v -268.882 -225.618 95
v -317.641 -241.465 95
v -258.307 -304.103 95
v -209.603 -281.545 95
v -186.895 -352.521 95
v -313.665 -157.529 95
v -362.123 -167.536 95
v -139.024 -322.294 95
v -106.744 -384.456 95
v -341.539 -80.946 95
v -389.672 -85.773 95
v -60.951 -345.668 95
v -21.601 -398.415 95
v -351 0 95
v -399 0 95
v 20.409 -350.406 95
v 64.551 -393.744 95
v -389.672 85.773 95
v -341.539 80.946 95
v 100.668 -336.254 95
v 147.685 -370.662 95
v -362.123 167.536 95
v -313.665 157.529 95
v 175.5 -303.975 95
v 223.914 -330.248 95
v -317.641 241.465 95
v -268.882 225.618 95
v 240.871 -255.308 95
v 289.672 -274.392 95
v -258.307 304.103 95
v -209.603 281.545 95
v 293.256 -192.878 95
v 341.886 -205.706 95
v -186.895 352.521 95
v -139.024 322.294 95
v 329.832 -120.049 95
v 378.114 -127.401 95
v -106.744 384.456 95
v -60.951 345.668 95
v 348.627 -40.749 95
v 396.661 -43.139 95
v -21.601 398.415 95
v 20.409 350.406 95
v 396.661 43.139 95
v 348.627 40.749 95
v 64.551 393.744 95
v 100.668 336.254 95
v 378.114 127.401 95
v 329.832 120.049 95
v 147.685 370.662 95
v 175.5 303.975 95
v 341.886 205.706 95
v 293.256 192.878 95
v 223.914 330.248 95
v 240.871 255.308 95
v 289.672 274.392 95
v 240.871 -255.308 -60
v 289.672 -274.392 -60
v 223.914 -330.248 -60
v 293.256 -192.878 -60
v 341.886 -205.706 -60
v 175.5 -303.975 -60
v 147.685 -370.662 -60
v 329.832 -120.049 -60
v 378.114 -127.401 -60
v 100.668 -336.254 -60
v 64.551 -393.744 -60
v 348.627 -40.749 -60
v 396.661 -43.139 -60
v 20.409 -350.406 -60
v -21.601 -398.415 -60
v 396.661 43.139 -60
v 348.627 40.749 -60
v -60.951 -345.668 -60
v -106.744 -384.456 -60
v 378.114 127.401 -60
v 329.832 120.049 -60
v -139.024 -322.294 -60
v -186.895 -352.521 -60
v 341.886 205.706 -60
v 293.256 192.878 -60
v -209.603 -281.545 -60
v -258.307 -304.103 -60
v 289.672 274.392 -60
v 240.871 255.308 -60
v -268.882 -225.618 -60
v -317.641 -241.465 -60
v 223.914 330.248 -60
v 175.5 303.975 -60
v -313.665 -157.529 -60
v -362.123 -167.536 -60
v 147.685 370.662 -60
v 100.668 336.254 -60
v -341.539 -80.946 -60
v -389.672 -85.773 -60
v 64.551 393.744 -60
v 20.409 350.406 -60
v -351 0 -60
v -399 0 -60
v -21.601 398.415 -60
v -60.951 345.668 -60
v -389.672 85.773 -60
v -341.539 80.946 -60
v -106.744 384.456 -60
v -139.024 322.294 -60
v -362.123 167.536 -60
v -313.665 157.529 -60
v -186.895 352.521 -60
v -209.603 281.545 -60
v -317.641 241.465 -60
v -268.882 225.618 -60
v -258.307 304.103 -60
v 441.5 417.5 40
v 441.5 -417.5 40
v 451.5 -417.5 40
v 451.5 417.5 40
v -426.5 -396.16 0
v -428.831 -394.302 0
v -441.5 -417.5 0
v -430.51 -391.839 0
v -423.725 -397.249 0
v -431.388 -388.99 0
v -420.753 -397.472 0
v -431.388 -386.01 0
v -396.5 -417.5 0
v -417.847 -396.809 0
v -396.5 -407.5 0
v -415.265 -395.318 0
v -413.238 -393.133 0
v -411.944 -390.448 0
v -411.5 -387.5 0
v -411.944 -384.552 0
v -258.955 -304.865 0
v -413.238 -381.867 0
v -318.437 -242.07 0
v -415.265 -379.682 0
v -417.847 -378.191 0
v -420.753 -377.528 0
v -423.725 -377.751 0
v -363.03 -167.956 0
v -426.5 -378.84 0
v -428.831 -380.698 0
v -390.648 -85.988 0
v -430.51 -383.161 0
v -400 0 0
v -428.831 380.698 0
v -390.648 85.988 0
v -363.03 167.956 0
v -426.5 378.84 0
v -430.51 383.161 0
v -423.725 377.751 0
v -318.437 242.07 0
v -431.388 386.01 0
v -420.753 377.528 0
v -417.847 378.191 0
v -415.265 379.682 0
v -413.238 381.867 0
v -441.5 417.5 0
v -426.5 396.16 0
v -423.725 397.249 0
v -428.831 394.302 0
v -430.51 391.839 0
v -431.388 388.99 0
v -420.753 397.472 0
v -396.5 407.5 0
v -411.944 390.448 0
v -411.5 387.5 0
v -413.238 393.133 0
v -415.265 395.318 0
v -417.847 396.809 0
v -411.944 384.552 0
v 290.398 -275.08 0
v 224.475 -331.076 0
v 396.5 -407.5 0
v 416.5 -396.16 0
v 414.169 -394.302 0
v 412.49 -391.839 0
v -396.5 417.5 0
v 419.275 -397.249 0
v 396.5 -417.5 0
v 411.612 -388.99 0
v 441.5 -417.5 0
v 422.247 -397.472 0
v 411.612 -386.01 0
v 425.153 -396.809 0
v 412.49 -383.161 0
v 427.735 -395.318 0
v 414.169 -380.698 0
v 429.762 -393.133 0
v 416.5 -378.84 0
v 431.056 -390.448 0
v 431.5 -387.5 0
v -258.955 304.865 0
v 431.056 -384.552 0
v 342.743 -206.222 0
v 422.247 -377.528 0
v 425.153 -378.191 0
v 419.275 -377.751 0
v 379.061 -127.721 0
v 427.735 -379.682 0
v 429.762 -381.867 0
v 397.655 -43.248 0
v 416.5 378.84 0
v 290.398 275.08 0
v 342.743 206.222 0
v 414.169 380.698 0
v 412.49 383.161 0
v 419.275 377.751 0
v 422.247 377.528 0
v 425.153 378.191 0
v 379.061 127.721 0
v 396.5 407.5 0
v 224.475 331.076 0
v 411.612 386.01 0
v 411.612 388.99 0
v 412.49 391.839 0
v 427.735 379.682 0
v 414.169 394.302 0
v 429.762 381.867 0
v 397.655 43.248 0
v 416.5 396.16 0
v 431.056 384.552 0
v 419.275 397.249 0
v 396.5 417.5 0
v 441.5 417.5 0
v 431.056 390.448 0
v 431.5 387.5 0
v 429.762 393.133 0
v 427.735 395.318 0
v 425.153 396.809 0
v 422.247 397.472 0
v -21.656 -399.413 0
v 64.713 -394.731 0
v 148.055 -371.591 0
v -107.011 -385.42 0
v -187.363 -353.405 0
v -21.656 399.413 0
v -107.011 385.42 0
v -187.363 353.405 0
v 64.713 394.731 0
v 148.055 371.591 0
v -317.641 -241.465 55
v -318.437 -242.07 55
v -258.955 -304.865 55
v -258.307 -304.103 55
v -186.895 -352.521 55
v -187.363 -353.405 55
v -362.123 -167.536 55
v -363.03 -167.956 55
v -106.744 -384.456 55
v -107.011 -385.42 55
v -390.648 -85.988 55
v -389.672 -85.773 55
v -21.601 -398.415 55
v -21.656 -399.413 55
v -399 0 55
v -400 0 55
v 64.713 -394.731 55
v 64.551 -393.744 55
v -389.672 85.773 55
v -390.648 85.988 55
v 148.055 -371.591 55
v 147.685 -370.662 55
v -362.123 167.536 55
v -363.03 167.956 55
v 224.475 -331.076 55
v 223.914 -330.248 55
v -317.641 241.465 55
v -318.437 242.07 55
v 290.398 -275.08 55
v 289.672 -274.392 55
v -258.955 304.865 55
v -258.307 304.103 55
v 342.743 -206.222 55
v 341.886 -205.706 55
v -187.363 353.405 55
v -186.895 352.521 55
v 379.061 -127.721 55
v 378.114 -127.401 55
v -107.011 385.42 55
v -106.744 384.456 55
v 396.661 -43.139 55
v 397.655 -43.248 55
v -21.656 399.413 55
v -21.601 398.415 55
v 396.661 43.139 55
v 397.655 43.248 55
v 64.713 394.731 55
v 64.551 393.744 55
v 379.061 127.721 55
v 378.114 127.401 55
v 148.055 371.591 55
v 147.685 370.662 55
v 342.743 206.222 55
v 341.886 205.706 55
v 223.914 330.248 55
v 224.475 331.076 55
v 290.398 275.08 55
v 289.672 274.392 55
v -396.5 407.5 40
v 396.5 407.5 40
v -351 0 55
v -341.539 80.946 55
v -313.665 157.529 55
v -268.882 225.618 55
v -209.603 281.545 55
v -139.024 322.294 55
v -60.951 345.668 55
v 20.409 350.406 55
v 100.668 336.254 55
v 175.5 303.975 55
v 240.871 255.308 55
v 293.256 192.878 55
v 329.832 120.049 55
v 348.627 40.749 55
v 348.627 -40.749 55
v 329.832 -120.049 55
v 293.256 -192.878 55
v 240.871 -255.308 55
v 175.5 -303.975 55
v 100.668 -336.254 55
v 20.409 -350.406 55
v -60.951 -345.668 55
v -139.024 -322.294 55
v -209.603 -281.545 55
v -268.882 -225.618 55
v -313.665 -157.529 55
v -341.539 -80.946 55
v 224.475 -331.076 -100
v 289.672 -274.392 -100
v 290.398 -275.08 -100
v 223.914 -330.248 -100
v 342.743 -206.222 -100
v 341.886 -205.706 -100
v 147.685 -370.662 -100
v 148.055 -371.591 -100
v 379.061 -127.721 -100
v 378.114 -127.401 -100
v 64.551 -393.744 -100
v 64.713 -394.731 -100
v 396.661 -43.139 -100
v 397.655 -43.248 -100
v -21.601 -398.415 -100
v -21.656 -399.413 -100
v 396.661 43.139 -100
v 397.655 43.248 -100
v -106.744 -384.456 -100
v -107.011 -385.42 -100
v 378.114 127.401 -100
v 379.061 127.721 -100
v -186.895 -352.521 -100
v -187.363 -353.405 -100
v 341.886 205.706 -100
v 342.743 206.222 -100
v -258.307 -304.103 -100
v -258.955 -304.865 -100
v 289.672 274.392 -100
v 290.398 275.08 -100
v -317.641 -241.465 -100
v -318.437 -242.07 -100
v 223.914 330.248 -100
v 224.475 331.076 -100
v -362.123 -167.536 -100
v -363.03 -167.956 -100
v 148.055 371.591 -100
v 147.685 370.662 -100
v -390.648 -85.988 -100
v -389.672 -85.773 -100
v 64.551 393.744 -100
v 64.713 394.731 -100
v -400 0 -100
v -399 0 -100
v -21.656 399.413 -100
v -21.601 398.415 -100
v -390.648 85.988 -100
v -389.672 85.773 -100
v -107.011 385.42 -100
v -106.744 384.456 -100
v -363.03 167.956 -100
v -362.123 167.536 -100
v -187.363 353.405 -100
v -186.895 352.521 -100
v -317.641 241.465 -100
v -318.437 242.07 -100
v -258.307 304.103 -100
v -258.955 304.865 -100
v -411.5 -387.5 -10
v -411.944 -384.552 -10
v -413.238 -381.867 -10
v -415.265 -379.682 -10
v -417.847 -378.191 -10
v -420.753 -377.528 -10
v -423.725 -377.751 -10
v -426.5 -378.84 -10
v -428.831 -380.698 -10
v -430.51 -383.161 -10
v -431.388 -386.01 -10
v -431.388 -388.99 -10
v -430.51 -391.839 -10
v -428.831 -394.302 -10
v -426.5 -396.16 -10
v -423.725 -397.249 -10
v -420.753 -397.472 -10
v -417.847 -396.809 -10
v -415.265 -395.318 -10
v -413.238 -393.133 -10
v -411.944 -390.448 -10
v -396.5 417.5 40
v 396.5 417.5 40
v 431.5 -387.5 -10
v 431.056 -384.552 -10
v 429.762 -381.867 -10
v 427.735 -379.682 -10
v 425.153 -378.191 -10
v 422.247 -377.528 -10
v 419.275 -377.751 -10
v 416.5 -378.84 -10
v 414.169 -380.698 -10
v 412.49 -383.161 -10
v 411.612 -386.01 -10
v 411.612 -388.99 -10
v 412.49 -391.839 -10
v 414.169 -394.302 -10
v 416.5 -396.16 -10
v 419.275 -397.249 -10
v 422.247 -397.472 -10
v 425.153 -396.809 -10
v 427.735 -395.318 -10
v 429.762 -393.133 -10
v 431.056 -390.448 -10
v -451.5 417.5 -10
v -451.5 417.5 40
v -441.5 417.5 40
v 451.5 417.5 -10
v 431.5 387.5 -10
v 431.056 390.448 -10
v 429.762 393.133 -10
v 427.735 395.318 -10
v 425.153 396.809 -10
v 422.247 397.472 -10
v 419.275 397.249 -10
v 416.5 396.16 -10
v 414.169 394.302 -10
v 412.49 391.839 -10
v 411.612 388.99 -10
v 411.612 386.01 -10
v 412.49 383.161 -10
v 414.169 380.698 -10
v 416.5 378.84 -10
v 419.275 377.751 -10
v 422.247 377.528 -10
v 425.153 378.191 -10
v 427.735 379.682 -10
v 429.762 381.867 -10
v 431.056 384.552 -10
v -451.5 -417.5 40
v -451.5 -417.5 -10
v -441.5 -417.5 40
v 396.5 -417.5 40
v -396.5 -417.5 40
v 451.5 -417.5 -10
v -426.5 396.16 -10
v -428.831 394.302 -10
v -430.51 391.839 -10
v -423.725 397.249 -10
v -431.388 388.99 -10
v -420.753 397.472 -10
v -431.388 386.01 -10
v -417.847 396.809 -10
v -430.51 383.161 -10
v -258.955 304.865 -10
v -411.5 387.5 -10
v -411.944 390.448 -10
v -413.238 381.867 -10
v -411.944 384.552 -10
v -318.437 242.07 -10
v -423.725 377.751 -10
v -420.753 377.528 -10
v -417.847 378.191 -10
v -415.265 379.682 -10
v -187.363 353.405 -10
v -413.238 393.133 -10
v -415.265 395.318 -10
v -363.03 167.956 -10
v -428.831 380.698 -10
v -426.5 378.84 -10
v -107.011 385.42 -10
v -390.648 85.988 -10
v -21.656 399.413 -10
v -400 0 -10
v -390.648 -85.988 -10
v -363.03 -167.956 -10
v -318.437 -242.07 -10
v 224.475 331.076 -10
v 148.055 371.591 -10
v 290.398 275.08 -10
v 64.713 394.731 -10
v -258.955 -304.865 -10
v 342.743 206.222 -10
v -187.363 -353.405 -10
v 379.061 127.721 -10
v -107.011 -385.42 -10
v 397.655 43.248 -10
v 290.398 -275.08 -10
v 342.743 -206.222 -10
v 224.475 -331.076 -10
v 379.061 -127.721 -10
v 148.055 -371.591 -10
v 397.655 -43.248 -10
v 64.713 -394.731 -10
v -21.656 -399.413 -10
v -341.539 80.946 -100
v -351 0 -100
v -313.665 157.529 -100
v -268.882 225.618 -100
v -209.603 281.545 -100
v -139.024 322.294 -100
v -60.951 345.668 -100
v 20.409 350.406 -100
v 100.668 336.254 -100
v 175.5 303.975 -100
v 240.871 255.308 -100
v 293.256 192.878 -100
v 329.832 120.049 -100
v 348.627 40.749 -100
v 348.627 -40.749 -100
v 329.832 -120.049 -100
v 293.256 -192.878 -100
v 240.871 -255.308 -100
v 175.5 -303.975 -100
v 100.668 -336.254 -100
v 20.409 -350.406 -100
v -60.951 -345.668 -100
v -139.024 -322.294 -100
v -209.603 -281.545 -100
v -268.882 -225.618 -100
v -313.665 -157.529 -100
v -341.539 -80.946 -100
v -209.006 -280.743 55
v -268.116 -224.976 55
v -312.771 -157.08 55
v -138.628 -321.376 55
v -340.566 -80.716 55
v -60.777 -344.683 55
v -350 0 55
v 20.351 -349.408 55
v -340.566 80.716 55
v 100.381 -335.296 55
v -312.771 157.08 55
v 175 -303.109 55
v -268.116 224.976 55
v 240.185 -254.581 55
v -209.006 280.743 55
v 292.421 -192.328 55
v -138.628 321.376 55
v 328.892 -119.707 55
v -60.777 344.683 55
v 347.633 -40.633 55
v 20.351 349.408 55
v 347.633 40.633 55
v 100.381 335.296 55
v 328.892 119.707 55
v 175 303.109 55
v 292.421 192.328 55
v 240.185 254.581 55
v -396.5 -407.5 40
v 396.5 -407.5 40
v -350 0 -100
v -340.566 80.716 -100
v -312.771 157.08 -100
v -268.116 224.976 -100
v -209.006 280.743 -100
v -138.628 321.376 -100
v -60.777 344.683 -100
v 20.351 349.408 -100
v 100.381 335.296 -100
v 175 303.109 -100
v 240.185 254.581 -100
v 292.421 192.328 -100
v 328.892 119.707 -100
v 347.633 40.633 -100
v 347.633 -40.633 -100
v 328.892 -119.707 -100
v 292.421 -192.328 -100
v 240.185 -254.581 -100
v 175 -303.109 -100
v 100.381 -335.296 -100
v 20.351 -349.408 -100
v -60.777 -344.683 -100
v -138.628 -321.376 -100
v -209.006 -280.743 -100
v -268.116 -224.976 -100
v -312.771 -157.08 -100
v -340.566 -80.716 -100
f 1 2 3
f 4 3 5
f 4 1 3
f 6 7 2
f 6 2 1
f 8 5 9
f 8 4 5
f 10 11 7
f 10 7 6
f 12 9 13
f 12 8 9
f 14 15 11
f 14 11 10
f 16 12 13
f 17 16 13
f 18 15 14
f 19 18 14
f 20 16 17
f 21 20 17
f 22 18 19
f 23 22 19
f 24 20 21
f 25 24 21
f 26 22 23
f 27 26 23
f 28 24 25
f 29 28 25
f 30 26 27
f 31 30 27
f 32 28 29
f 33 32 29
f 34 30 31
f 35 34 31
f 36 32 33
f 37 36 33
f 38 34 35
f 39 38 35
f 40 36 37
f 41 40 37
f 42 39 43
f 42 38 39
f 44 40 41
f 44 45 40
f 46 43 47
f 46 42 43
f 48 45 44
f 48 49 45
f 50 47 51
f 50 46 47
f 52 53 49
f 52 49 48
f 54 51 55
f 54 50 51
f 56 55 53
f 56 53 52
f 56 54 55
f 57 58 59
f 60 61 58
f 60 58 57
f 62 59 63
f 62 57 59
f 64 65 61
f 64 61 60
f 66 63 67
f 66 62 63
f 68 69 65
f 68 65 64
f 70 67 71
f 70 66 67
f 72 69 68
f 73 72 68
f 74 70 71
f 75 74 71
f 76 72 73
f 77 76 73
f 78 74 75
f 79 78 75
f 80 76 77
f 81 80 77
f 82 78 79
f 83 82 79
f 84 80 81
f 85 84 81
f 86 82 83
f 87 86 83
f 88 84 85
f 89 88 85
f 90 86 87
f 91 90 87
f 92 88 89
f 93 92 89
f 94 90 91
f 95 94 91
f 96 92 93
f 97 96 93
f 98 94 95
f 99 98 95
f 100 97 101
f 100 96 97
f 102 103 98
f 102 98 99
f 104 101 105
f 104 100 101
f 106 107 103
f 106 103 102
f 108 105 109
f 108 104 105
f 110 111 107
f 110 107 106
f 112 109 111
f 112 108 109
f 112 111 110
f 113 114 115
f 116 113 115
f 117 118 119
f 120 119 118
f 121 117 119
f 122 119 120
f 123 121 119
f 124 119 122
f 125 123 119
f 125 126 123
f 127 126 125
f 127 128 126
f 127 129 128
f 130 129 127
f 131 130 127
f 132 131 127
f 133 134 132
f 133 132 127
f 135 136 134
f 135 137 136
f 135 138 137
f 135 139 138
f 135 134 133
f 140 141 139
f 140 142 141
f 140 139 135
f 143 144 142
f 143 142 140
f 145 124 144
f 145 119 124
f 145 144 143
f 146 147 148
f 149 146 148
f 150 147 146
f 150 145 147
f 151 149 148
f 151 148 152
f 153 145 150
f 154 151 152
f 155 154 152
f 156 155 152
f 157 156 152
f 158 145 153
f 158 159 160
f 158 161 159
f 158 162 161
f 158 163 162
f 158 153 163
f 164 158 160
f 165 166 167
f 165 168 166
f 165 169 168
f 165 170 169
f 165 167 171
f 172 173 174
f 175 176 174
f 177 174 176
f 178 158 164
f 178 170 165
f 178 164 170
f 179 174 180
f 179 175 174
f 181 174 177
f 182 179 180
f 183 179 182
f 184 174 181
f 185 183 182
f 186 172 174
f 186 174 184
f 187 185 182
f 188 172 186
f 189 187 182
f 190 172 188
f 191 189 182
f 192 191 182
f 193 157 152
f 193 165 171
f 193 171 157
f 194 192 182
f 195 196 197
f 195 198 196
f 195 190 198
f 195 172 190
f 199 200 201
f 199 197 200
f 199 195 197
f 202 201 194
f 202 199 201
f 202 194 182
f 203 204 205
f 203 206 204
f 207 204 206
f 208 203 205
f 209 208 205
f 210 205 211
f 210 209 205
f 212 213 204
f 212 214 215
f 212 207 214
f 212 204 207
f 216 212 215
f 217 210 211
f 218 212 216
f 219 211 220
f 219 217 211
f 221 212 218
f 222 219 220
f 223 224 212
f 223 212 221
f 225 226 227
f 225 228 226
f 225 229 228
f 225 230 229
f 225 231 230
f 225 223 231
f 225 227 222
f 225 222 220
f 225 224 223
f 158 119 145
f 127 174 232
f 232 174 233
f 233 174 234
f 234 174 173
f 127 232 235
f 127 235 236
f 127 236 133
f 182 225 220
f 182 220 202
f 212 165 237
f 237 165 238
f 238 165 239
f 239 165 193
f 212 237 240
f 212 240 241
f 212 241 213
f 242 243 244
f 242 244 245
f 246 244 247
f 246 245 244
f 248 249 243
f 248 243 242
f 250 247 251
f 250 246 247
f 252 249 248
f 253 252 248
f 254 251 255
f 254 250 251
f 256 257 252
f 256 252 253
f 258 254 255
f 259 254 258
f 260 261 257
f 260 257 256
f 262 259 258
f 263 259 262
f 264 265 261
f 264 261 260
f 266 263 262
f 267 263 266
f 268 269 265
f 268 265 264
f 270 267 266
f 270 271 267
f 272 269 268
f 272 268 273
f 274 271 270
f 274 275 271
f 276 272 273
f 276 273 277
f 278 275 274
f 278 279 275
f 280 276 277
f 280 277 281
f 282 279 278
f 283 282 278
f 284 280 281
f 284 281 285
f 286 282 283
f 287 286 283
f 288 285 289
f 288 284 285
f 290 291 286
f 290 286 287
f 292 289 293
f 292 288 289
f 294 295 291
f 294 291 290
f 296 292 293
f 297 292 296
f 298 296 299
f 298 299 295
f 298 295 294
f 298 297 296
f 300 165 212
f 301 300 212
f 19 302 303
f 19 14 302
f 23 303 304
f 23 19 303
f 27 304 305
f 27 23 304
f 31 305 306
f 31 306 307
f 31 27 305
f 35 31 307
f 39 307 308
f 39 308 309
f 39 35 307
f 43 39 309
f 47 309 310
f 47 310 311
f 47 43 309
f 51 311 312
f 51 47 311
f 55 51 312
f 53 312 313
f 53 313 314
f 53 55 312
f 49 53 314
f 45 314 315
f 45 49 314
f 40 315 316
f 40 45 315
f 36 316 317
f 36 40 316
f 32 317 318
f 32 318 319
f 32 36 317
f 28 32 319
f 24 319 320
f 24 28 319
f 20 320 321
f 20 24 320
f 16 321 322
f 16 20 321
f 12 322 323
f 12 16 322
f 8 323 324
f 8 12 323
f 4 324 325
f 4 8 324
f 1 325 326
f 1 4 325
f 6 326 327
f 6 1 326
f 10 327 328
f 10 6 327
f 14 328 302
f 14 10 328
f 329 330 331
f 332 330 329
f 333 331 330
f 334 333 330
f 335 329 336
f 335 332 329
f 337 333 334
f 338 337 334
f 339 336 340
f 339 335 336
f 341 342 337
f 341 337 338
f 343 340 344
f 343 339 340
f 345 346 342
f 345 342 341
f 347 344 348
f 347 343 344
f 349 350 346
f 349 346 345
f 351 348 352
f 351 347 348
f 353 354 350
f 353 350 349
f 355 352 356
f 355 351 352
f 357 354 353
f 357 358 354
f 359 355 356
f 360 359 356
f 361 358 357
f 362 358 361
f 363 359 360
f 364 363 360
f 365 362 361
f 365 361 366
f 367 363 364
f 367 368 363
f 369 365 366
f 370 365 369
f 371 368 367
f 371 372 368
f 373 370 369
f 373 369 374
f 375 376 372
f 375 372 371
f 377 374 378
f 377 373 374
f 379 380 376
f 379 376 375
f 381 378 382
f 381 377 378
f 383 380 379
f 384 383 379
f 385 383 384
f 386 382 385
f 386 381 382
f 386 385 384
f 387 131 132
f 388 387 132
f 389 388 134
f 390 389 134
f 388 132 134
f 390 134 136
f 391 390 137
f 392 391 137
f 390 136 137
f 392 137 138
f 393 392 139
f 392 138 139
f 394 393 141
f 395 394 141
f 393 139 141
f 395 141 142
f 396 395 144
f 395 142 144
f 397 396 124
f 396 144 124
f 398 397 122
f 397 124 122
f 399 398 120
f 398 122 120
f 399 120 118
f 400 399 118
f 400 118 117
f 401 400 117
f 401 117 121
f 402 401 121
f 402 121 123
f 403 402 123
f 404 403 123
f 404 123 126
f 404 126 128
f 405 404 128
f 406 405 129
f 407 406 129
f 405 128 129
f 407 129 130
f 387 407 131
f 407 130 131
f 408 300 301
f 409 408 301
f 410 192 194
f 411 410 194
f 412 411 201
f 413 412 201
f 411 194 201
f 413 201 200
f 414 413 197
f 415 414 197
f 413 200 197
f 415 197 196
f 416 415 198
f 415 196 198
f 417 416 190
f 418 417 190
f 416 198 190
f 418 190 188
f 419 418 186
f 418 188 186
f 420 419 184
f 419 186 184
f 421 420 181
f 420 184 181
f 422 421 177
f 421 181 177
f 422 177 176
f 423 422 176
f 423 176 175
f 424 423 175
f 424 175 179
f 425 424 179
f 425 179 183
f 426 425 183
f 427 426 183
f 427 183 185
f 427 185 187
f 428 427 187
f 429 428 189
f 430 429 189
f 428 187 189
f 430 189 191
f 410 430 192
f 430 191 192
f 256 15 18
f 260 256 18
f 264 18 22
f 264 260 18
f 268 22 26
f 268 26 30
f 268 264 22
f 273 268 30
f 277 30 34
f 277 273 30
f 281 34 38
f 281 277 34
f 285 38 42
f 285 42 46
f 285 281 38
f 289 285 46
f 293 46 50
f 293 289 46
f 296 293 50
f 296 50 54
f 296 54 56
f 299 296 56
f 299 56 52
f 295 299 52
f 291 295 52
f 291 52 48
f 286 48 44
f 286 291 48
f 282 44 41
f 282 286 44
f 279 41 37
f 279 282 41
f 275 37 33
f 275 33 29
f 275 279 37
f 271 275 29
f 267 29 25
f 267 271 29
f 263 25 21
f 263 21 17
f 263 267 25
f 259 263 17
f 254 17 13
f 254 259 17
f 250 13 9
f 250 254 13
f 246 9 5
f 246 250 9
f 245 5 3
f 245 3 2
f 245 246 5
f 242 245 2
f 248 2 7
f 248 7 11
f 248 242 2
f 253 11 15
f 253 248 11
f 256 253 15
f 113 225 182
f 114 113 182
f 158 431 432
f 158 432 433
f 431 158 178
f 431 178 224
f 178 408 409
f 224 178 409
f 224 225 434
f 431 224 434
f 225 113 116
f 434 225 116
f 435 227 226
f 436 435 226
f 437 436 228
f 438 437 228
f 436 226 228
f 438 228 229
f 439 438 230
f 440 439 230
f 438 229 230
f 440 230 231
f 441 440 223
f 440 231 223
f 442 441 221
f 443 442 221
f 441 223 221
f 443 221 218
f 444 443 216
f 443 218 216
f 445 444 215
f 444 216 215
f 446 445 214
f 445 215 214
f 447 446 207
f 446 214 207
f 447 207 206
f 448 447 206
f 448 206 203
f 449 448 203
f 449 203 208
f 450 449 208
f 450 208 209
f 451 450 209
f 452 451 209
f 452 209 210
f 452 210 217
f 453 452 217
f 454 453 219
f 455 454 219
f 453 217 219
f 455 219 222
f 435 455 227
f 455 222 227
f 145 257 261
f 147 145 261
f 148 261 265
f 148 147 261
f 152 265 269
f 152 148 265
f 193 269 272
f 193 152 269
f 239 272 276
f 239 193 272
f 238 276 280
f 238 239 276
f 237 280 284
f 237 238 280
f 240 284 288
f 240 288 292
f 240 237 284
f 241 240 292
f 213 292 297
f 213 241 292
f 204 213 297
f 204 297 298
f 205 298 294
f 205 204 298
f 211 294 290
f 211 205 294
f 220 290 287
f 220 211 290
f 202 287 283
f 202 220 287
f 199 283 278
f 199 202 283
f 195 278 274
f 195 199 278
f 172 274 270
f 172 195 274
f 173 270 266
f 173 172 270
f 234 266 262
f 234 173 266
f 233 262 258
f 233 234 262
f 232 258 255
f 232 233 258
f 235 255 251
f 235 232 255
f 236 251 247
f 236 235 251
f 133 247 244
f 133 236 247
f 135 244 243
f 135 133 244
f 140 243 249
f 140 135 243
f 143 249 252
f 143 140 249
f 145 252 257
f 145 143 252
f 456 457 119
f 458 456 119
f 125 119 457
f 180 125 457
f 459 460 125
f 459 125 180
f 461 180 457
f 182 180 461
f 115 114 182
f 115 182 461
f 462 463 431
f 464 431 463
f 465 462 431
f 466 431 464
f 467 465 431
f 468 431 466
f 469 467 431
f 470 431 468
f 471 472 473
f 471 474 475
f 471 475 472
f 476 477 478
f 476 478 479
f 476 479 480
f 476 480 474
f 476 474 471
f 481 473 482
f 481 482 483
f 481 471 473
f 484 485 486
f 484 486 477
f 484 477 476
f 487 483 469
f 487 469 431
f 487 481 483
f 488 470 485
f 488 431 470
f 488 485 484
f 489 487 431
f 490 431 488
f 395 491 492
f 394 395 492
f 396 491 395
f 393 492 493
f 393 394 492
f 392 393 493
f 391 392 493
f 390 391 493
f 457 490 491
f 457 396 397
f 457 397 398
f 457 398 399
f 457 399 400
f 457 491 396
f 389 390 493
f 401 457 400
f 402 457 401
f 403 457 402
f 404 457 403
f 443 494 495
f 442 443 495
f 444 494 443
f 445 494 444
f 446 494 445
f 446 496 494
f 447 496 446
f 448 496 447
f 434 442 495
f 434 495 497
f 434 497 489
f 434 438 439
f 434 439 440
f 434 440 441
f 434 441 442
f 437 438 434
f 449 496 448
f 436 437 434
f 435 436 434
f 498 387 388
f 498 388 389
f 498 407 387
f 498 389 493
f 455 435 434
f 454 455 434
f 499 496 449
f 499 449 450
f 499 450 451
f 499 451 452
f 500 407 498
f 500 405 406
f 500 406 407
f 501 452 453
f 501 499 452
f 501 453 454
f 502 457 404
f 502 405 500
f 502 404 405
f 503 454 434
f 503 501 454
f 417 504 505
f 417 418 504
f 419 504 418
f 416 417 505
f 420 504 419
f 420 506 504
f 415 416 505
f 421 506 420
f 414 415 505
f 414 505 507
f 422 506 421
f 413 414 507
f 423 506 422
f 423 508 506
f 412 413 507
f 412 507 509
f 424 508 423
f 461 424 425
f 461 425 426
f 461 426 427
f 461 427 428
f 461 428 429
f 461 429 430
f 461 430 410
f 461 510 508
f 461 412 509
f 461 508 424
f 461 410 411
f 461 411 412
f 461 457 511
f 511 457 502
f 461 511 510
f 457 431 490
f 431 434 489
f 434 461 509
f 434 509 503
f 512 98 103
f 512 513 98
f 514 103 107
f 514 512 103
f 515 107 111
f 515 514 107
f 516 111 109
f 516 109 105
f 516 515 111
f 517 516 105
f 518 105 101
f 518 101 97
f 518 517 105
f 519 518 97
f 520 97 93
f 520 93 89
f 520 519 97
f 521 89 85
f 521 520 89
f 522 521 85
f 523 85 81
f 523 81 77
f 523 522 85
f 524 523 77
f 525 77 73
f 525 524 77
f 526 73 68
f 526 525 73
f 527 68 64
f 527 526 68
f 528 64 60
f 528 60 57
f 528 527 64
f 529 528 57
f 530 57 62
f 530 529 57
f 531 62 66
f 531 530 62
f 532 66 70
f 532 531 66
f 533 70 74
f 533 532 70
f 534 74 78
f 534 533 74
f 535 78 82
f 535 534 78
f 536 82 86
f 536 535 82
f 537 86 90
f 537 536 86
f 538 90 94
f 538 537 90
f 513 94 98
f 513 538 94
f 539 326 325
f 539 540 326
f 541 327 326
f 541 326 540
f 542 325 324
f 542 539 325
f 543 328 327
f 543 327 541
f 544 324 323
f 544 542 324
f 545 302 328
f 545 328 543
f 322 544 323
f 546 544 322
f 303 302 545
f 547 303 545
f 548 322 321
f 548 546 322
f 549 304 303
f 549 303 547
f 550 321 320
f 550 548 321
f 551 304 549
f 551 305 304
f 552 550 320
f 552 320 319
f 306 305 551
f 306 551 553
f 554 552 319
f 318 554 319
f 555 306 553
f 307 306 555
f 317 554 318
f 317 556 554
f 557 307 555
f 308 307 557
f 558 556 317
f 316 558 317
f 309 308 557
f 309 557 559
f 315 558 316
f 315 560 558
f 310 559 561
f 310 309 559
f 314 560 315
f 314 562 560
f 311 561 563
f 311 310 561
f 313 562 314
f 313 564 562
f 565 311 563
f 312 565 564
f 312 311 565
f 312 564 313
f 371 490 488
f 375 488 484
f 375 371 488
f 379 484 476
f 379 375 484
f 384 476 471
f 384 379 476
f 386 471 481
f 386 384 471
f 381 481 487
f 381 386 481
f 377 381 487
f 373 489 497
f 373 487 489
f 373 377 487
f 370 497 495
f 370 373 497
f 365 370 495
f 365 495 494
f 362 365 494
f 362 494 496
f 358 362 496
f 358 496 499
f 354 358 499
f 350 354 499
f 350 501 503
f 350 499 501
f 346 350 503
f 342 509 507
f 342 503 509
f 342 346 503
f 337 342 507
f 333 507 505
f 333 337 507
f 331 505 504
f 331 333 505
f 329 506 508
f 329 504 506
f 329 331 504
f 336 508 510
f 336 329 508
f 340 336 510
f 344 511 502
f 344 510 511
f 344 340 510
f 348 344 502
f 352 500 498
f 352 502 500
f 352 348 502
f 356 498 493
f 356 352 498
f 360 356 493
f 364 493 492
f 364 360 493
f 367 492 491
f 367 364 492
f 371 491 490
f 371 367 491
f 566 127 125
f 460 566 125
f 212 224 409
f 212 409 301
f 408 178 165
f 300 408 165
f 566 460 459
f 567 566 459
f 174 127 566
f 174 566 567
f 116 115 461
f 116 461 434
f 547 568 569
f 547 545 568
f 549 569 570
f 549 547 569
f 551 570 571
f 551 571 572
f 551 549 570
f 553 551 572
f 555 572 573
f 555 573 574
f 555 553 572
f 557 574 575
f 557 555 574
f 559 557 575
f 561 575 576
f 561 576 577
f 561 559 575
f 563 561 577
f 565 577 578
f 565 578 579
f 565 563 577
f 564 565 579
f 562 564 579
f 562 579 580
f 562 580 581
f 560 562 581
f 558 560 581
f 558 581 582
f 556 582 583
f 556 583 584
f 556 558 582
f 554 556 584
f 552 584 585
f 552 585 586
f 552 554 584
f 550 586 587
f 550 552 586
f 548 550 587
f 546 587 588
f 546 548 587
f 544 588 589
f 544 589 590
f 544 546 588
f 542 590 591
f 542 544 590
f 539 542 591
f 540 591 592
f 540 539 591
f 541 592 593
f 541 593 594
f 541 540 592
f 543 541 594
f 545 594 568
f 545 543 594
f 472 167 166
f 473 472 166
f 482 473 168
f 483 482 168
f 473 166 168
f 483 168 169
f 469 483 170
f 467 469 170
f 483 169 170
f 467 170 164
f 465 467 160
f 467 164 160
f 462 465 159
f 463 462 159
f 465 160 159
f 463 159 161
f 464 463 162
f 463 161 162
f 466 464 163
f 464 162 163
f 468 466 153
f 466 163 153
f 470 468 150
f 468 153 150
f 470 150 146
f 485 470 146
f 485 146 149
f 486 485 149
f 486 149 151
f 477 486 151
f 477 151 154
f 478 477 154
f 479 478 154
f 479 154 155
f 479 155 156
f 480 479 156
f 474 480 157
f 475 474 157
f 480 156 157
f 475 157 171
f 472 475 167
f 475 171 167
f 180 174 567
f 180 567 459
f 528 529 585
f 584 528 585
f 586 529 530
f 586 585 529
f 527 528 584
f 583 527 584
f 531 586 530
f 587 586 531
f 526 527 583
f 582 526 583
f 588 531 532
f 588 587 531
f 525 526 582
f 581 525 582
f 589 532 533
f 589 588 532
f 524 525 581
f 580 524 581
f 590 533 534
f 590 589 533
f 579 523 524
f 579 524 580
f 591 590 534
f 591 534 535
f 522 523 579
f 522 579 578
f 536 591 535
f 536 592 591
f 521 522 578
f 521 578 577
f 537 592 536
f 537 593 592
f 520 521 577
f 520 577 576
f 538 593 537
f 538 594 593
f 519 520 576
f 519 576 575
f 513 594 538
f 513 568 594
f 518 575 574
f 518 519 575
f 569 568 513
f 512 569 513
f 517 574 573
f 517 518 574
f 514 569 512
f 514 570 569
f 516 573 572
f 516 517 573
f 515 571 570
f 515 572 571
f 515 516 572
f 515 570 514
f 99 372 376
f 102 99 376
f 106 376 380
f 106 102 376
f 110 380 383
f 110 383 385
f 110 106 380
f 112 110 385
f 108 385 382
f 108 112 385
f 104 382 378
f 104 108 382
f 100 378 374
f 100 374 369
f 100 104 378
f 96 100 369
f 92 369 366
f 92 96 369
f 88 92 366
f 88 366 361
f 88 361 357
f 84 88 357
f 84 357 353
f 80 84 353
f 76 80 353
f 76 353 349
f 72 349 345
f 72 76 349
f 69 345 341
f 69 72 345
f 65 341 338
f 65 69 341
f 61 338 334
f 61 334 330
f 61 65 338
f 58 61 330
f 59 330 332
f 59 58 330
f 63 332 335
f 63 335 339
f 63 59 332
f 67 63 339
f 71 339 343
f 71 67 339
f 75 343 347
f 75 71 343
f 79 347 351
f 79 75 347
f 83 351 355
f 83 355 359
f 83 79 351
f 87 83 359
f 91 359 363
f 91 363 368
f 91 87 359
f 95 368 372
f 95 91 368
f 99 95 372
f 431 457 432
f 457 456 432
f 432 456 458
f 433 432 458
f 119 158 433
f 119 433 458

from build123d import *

# Parameters (mm, degrees)
F2_W     = 903
F2_H     = 835
F2_R     = 10
F2_R_2   = 400
F3_DEPTH = 10
F4_W     = 793
F4_H     = 10
F4_W_2   = 10
F4_H_2   = 835
F5_DEPTH = 50


with BuildPart() as f1:
    # F0 (on Front) → F1 (revolve)
    with BuildSketch(Plane.XZ):
        Polygon((-351, -100), (-350, -100), (-350, 55), (-351, 55), (-351, 95), (-399, 95), (-399, 55), (-400, 55), (-400, -100), (-399, -100), (-399, -60), (-351, -60), align=None)
    revolve(axis=Axis((0, 0, -77.049306), (0, 0, -1)))

    # F2 (on Top) → F3 (join)
    with BuildSketch(Plane.XY):
        Rectangle(F2_W, F2_H)
        with Locations((-421.5, -387.5)):
            Circle(F2_R, mode=Mode.SUBTRACT)
        with Locations((421.5, -387.5)):
            Circle(F2_R, mode=Mode.SUBTRACT)
        with Locations((-421.5, 387.5)):
            Circle(F2_R, mode=Mode.SUBTRACT)
        Circle(F2_R_2, mode=Mode.SUBTRACT)
        with Locations((421.5, 387.5)):
            Circle(F2_R, mode=Mode.SUBTRACT)
    extrude(amount=-F3_DEPTH)

    # F4 (on face) → F5 (join)
    with BuildSketch(Plane(origin=(0, 0, -10), x_dir=(1, 0, 0), z_dir=(0, 0, -1))):
        with Locations((0, 412.5)):
            Rectangle(F4_W, F4_H)
        with Locations((-446.5, 0)):
            Rectangle(F4_W_2, F4_H_2)
        with Locations((0, -412.5)):
            Rectangle(F4_W, F4_H)
        with Locations((446.5, 0)):
            Rectangle(F4_W_2, F4_H_2)
    extrude(amount=-F5_DEPTH)


solid = f1.part
